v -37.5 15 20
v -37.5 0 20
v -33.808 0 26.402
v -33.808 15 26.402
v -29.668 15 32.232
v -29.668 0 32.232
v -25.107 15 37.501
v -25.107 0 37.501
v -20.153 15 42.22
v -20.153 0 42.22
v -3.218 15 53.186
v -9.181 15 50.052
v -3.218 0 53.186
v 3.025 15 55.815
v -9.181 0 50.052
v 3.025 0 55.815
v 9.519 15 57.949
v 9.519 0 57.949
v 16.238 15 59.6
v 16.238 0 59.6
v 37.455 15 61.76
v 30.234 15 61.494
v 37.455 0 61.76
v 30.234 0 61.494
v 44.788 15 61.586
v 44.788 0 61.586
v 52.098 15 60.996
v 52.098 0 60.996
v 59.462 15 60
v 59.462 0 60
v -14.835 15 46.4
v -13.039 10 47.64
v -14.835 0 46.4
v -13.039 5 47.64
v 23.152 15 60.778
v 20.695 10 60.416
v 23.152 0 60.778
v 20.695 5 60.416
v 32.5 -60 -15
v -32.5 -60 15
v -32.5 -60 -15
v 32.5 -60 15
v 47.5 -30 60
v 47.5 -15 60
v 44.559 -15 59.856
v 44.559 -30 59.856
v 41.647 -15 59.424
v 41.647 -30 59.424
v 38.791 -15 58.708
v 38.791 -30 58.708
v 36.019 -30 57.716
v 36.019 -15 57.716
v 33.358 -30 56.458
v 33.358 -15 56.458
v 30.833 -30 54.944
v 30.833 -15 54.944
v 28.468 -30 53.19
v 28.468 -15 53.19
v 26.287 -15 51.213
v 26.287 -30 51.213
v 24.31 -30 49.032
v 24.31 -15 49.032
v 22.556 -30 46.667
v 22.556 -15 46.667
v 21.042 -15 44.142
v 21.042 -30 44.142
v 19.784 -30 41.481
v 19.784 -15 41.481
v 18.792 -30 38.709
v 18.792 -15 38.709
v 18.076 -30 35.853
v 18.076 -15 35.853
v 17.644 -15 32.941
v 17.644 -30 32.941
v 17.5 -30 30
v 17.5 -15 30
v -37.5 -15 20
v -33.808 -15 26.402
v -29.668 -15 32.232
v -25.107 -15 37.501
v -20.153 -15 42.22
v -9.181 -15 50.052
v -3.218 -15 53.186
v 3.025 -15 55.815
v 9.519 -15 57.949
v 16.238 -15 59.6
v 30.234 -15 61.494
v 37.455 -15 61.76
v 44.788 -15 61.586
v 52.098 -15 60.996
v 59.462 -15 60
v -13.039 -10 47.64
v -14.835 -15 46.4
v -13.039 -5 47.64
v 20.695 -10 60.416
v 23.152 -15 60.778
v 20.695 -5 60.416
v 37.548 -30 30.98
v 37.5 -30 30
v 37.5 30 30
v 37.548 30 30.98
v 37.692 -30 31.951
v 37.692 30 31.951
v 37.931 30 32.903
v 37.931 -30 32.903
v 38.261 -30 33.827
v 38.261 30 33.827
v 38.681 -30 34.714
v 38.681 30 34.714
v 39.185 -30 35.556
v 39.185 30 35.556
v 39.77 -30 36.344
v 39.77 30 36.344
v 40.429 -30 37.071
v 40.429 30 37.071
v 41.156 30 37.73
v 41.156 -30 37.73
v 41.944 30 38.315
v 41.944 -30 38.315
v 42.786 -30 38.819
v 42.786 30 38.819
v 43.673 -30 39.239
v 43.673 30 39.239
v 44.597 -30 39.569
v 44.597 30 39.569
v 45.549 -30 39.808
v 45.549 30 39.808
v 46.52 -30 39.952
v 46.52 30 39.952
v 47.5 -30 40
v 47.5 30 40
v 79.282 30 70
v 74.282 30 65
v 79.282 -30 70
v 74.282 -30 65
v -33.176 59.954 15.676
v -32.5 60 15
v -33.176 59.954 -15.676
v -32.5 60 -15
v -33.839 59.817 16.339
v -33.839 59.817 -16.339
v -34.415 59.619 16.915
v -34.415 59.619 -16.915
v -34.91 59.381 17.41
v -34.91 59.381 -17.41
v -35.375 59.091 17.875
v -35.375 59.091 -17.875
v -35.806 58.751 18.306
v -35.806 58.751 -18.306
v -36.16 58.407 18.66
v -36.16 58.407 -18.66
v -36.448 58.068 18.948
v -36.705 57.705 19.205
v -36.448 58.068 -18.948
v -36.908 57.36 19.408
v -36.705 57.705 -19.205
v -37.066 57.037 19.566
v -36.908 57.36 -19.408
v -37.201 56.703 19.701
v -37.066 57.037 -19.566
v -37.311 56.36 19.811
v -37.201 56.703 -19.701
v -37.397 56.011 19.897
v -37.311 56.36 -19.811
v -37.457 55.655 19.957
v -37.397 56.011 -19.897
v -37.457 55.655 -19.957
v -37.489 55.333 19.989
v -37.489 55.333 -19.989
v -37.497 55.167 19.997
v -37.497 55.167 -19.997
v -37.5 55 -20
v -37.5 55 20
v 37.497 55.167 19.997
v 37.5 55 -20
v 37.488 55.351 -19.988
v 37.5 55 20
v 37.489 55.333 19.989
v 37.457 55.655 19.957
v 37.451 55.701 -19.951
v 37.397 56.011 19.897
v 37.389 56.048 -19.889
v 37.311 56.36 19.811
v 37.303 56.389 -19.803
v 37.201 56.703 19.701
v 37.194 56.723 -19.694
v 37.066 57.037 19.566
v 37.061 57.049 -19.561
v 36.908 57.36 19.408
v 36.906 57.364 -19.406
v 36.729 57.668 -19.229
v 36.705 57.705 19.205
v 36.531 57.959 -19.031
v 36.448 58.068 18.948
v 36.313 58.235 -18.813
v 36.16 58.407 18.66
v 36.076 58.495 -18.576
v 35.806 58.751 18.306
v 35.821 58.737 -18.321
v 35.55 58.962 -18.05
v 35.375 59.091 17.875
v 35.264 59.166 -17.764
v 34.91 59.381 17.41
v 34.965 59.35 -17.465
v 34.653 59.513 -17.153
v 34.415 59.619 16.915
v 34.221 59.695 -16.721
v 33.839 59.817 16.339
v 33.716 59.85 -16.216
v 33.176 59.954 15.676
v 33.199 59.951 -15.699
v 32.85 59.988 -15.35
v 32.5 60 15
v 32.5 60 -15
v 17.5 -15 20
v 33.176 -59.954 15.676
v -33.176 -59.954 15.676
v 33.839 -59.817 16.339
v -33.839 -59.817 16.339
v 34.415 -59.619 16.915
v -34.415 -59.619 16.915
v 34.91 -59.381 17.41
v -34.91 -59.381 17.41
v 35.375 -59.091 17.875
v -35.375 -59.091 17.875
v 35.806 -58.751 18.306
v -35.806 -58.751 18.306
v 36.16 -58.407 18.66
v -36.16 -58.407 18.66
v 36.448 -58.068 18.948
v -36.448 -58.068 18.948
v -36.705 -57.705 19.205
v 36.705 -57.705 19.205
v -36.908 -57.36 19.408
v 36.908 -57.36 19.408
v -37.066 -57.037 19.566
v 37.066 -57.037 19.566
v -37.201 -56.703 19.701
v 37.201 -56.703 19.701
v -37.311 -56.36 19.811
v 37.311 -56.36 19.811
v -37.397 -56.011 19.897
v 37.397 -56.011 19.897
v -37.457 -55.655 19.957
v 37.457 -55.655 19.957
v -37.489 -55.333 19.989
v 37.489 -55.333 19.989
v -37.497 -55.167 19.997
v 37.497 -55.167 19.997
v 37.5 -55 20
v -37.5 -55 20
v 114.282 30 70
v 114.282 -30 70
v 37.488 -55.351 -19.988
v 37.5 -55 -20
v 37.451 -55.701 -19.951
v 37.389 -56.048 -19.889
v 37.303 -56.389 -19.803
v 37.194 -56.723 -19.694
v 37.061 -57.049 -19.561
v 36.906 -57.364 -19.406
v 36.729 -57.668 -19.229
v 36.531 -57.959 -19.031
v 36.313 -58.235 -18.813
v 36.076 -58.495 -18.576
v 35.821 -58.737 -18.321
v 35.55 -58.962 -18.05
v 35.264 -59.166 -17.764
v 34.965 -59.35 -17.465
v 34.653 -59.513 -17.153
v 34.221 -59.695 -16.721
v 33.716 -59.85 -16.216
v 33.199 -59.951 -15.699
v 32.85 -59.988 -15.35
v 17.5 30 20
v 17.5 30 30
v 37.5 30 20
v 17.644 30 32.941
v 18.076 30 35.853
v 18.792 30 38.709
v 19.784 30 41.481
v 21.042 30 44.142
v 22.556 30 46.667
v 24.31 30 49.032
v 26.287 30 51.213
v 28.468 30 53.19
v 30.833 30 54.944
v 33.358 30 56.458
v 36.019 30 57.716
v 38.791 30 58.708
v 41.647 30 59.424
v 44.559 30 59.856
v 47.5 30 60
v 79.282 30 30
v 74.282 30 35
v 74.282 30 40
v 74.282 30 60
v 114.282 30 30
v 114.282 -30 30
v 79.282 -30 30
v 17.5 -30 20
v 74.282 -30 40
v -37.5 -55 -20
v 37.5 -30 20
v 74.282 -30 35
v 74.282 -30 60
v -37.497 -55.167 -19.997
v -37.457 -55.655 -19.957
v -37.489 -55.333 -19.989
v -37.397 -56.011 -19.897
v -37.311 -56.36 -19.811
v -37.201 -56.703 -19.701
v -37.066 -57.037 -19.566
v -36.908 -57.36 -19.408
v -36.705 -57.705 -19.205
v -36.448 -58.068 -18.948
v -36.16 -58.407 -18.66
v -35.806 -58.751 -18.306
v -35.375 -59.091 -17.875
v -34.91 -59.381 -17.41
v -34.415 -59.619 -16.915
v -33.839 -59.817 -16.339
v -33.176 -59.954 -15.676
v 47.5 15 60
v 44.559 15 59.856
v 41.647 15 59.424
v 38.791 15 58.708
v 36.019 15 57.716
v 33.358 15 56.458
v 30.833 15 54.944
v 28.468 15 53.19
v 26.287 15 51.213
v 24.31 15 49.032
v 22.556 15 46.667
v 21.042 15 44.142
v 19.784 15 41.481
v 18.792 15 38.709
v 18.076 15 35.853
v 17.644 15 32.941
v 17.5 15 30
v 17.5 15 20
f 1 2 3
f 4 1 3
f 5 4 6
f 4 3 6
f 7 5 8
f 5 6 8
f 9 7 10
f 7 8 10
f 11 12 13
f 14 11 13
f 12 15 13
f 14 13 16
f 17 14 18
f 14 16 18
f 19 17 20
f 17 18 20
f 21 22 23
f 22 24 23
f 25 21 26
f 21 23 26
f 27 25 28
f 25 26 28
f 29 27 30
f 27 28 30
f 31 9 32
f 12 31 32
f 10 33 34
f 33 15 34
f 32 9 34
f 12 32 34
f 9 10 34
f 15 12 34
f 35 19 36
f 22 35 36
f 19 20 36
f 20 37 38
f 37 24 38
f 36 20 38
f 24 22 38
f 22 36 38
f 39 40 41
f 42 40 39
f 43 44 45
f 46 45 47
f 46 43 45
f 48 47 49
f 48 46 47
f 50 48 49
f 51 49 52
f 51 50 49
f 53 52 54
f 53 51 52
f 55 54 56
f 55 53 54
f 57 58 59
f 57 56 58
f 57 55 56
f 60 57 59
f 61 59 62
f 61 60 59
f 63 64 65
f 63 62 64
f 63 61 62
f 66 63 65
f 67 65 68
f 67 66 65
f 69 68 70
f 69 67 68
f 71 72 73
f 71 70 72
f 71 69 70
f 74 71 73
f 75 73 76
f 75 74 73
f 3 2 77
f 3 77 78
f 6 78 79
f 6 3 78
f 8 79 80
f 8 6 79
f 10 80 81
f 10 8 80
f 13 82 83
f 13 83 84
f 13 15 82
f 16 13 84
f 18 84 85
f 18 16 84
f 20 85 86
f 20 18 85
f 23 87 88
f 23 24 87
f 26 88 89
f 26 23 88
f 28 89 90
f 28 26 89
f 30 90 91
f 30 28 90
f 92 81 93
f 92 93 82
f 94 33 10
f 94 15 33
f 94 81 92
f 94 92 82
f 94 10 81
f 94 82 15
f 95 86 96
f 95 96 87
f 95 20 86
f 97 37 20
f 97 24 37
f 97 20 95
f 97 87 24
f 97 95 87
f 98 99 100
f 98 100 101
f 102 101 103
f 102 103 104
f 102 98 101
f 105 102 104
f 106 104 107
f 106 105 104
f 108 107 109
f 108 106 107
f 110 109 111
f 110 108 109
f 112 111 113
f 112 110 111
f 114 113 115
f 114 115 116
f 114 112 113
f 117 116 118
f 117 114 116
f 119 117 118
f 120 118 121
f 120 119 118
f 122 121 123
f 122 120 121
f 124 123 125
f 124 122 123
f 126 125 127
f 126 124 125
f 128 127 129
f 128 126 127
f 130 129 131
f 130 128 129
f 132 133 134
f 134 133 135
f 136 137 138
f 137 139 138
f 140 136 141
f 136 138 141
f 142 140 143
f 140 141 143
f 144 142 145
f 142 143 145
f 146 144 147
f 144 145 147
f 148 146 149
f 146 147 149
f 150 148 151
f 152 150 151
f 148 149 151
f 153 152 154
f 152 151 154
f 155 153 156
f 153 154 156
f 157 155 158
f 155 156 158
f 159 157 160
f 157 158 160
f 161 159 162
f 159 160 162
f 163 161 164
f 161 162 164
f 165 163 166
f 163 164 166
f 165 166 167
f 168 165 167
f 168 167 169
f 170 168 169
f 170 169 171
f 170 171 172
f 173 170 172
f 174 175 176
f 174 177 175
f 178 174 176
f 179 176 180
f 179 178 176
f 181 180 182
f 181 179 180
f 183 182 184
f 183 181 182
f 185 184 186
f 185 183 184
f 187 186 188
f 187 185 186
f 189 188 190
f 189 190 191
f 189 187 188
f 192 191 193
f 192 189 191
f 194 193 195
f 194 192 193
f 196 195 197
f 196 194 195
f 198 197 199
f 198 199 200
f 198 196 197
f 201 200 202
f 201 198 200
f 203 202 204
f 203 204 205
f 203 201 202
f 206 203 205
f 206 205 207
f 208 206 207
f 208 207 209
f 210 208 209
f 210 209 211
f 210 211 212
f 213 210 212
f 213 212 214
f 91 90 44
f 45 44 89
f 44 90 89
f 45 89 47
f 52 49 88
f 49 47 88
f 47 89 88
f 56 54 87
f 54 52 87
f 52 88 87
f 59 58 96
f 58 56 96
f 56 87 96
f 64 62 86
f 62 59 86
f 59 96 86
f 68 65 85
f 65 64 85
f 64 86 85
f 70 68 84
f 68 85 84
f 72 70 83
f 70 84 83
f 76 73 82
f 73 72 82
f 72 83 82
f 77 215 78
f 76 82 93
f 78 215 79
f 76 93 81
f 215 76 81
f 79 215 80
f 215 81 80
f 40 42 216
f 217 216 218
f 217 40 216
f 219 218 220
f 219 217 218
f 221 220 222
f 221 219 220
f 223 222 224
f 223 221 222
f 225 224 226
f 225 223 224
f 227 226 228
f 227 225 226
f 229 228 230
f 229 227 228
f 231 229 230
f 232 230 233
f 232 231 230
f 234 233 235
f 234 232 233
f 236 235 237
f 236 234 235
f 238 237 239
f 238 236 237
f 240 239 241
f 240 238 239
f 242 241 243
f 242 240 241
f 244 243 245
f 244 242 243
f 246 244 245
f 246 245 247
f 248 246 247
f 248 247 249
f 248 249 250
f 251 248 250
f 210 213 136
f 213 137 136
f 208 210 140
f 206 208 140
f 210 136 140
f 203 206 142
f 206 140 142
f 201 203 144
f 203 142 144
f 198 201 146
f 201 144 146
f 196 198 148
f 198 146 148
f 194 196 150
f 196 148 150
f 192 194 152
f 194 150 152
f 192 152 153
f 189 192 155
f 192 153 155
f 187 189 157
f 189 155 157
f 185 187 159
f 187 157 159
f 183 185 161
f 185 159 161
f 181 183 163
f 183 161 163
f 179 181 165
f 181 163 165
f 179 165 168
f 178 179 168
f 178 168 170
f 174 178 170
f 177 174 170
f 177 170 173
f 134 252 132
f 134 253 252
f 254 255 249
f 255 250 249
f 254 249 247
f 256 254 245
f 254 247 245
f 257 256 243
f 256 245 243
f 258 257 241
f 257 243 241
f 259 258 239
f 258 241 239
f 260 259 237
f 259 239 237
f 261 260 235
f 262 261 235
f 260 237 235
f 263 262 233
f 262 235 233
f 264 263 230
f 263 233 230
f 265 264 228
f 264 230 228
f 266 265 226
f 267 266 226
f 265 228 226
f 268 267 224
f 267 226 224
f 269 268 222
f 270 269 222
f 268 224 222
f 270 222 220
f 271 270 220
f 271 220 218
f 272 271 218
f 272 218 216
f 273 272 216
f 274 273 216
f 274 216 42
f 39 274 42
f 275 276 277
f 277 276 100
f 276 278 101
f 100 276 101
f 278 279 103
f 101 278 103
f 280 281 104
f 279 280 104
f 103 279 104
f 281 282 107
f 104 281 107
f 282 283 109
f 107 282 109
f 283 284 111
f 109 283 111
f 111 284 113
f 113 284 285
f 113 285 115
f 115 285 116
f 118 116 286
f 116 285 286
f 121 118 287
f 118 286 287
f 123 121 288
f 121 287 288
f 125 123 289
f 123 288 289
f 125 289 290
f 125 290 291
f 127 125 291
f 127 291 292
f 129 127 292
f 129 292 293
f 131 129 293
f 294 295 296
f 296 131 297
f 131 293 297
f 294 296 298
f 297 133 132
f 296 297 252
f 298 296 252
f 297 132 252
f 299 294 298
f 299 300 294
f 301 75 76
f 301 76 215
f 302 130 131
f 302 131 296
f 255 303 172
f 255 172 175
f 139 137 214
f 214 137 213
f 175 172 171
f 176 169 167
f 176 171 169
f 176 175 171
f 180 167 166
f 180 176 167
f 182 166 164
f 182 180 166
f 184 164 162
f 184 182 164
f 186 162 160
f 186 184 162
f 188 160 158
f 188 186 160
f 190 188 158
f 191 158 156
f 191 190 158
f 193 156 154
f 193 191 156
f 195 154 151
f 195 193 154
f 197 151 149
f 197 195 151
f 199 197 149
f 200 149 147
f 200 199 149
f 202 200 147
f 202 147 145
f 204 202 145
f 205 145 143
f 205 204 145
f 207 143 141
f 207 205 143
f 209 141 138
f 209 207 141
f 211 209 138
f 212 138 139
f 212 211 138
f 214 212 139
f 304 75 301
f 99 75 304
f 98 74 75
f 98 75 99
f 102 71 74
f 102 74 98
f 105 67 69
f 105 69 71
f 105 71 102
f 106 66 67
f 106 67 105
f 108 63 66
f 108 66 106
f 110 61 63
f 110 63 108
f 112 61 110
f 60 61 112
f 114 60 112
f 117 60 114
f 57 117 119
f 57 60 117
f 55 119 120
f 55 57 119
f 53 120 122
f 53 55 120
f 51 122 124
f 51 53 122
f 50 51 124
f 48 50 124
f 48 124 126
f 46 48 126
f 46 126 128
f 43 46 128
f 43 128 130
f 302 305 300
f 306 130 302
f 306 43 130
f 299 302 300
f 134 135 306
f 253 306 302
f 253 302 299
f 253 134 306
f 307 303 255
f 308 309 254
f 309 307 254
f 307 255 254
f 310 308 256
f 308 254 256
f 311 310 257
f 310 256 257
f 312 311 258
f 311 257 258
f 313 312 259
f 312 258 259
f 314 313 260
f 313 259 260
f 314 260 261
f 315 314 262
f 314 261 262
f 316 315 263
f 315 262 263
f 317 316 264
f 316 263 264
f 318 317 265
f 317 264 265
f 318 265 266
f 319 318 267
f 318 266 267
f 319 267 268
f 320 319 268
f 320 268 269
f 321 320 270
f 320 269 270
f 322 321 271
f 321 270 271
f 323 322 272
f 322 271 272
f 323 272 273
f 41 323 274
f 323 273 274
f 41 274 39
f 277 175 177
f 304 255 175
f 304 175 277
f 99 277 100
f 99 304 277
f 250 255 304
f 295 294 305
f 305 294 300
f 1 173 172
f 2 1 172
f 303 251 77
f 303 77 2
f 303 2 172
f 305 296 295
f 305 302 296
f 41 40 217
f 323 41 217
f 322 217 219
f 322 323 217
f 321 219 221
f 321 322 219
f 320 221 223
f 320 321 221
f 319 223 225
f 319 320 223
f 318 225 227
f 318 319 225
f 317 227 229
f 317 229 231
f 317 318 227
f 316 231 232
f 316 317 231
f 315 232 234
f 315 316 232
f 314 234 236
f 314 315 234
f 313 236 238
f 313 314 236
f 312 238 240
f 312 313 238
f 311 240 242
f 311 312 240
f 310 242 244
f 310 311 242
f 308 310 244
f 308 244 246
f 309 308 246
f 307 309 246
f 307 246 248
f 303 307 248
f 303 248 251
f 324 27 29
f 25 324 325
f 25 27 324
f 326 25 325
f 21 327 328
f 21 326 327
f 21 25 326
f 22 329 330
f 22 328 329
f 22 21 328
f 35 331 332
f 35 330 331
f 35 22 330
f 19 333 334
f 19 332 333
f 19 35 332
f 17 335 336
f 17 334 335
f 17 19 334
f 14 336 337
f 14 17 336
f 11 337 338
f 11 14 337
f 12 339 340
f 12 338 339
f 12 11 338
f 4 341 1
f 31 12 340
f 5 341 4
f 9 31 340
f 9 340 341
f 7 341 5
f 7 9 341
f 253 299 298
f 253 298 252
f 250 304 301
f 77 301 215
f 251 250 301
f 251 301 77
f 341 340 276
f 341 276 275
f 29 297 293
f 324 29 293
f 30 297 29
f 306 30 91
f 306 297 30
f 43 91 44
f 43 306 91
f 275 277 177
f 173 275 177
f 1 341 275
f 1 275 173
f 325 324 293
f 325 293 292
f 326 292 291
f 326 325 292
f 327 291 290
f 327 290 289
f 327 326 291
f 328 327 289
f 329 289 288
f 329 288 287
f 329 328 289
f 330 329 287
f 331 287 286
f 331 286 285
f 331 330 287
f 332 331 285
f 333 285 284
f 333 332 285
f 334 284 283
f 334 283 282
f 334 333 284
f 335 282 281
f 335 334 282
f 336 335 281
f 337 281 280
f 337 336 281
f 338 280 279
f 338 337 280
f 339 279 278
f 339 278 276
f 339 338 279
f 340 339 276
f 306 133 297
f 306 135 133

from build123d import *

# Parameters (mm, degrees)
F1_DEPTH = 30
F2_DEPTH = 60
F3_DEPTH = 15
F4_R     = 5
F5_SIZE  = 5
F6_R     = 5


with BuildPart() as f1:
    # F0 (on Front) → F1 (new body, symmetric)
    with BuildSketch(Plane.XZ):
        with BuildLine():
            Line((17.5, 20), (37.5, 20))
            Line((37.5, 20), (37.5, 30))
            ThreePointArc((37.5, 30), (40.428932, 37.071068), (47.5, 40))
            Line((47.5, 40), (74.281626, 40))
            Line((74.281626, 40), (74.281626, 60))
            Line((74.281626, 60), (59.462495, 60))
            Line((59.462495, 60), (47.5, 60))
            ThreePointArc((47.5, 60), (26.286797, 51.213203), (17.5, 30))
            Line((17.5, 30), (17.5, 20))
        make_face()
        Polygon((74.281626, 70), (74.281626, 60), (74.281626, 40), (74.281626, 30), (114.281626, 30), (114.281626, 70), align=None)
    extrude(amount=F1_DEPTH, both=True)

    # F0 (on Front) → F2 (join, symmetric)
    with BuildSketch(Plane.XZ):
        Polygon((-37.5, -20), (37.5, -20), (37.5, 20), (17.5, 20), (-37.5, 20), align=None)
    extrude(amount=F2_DEPTH, both=True)

    # F0 (on Front) → F3 (join, symmetric)
    with BuildSketch(Plane.XZ):
        with BuildLine():
            add(Edge.make_bspline(
                [(-37.5, 20), (-19.089822, 55.62811), (19.591885, 66.455275), (59.462495, 60)],
                knots=[0, 0, 0, 0, 104.88911, 104.88911, 104.88911, 104.88911], degree=3))
            Line((-37.5, 20), (17.5, 20))
            Line((17.5, 20), (17.5, 30))
            ThreePointArc((17.5, 30), (26.286797, 51.213203), (47.5, 60))
            Line((47.5, 60), (59.462495, 60))
        make_face()
    extrude(amount=F3_DEPTH, both=True)

    # F4
    f4_edges = [f1.edges().sort_by_distance(p)[0] for p in [
        (0, -60, 20),
        (-37.5, -60, 0),
        (0, -60, -20),
        (37.5, -60, 0),
    ]]
    fillet(f4_edges, radius=F4_R)

    # F5
    f5_edges = [f1.edges().sort_by_distance(p)[0] for p in [
        (74.281626, 0, 70),
        (74.281626, 0, 30),
    ]]
    chamfer(f5_edges, length=F5_SIZE)

    # F6
    f6_edges = [f1.edges().sort_by_distance(p)[0] for p in [
        (0, 60, 20),
        (-37.5, 60, 0),
        (0, 60, -20),
        (37.5, 60, 0),
    ]]
    fillet(f6_edges, radius=F6_R)


solid = f1.part
